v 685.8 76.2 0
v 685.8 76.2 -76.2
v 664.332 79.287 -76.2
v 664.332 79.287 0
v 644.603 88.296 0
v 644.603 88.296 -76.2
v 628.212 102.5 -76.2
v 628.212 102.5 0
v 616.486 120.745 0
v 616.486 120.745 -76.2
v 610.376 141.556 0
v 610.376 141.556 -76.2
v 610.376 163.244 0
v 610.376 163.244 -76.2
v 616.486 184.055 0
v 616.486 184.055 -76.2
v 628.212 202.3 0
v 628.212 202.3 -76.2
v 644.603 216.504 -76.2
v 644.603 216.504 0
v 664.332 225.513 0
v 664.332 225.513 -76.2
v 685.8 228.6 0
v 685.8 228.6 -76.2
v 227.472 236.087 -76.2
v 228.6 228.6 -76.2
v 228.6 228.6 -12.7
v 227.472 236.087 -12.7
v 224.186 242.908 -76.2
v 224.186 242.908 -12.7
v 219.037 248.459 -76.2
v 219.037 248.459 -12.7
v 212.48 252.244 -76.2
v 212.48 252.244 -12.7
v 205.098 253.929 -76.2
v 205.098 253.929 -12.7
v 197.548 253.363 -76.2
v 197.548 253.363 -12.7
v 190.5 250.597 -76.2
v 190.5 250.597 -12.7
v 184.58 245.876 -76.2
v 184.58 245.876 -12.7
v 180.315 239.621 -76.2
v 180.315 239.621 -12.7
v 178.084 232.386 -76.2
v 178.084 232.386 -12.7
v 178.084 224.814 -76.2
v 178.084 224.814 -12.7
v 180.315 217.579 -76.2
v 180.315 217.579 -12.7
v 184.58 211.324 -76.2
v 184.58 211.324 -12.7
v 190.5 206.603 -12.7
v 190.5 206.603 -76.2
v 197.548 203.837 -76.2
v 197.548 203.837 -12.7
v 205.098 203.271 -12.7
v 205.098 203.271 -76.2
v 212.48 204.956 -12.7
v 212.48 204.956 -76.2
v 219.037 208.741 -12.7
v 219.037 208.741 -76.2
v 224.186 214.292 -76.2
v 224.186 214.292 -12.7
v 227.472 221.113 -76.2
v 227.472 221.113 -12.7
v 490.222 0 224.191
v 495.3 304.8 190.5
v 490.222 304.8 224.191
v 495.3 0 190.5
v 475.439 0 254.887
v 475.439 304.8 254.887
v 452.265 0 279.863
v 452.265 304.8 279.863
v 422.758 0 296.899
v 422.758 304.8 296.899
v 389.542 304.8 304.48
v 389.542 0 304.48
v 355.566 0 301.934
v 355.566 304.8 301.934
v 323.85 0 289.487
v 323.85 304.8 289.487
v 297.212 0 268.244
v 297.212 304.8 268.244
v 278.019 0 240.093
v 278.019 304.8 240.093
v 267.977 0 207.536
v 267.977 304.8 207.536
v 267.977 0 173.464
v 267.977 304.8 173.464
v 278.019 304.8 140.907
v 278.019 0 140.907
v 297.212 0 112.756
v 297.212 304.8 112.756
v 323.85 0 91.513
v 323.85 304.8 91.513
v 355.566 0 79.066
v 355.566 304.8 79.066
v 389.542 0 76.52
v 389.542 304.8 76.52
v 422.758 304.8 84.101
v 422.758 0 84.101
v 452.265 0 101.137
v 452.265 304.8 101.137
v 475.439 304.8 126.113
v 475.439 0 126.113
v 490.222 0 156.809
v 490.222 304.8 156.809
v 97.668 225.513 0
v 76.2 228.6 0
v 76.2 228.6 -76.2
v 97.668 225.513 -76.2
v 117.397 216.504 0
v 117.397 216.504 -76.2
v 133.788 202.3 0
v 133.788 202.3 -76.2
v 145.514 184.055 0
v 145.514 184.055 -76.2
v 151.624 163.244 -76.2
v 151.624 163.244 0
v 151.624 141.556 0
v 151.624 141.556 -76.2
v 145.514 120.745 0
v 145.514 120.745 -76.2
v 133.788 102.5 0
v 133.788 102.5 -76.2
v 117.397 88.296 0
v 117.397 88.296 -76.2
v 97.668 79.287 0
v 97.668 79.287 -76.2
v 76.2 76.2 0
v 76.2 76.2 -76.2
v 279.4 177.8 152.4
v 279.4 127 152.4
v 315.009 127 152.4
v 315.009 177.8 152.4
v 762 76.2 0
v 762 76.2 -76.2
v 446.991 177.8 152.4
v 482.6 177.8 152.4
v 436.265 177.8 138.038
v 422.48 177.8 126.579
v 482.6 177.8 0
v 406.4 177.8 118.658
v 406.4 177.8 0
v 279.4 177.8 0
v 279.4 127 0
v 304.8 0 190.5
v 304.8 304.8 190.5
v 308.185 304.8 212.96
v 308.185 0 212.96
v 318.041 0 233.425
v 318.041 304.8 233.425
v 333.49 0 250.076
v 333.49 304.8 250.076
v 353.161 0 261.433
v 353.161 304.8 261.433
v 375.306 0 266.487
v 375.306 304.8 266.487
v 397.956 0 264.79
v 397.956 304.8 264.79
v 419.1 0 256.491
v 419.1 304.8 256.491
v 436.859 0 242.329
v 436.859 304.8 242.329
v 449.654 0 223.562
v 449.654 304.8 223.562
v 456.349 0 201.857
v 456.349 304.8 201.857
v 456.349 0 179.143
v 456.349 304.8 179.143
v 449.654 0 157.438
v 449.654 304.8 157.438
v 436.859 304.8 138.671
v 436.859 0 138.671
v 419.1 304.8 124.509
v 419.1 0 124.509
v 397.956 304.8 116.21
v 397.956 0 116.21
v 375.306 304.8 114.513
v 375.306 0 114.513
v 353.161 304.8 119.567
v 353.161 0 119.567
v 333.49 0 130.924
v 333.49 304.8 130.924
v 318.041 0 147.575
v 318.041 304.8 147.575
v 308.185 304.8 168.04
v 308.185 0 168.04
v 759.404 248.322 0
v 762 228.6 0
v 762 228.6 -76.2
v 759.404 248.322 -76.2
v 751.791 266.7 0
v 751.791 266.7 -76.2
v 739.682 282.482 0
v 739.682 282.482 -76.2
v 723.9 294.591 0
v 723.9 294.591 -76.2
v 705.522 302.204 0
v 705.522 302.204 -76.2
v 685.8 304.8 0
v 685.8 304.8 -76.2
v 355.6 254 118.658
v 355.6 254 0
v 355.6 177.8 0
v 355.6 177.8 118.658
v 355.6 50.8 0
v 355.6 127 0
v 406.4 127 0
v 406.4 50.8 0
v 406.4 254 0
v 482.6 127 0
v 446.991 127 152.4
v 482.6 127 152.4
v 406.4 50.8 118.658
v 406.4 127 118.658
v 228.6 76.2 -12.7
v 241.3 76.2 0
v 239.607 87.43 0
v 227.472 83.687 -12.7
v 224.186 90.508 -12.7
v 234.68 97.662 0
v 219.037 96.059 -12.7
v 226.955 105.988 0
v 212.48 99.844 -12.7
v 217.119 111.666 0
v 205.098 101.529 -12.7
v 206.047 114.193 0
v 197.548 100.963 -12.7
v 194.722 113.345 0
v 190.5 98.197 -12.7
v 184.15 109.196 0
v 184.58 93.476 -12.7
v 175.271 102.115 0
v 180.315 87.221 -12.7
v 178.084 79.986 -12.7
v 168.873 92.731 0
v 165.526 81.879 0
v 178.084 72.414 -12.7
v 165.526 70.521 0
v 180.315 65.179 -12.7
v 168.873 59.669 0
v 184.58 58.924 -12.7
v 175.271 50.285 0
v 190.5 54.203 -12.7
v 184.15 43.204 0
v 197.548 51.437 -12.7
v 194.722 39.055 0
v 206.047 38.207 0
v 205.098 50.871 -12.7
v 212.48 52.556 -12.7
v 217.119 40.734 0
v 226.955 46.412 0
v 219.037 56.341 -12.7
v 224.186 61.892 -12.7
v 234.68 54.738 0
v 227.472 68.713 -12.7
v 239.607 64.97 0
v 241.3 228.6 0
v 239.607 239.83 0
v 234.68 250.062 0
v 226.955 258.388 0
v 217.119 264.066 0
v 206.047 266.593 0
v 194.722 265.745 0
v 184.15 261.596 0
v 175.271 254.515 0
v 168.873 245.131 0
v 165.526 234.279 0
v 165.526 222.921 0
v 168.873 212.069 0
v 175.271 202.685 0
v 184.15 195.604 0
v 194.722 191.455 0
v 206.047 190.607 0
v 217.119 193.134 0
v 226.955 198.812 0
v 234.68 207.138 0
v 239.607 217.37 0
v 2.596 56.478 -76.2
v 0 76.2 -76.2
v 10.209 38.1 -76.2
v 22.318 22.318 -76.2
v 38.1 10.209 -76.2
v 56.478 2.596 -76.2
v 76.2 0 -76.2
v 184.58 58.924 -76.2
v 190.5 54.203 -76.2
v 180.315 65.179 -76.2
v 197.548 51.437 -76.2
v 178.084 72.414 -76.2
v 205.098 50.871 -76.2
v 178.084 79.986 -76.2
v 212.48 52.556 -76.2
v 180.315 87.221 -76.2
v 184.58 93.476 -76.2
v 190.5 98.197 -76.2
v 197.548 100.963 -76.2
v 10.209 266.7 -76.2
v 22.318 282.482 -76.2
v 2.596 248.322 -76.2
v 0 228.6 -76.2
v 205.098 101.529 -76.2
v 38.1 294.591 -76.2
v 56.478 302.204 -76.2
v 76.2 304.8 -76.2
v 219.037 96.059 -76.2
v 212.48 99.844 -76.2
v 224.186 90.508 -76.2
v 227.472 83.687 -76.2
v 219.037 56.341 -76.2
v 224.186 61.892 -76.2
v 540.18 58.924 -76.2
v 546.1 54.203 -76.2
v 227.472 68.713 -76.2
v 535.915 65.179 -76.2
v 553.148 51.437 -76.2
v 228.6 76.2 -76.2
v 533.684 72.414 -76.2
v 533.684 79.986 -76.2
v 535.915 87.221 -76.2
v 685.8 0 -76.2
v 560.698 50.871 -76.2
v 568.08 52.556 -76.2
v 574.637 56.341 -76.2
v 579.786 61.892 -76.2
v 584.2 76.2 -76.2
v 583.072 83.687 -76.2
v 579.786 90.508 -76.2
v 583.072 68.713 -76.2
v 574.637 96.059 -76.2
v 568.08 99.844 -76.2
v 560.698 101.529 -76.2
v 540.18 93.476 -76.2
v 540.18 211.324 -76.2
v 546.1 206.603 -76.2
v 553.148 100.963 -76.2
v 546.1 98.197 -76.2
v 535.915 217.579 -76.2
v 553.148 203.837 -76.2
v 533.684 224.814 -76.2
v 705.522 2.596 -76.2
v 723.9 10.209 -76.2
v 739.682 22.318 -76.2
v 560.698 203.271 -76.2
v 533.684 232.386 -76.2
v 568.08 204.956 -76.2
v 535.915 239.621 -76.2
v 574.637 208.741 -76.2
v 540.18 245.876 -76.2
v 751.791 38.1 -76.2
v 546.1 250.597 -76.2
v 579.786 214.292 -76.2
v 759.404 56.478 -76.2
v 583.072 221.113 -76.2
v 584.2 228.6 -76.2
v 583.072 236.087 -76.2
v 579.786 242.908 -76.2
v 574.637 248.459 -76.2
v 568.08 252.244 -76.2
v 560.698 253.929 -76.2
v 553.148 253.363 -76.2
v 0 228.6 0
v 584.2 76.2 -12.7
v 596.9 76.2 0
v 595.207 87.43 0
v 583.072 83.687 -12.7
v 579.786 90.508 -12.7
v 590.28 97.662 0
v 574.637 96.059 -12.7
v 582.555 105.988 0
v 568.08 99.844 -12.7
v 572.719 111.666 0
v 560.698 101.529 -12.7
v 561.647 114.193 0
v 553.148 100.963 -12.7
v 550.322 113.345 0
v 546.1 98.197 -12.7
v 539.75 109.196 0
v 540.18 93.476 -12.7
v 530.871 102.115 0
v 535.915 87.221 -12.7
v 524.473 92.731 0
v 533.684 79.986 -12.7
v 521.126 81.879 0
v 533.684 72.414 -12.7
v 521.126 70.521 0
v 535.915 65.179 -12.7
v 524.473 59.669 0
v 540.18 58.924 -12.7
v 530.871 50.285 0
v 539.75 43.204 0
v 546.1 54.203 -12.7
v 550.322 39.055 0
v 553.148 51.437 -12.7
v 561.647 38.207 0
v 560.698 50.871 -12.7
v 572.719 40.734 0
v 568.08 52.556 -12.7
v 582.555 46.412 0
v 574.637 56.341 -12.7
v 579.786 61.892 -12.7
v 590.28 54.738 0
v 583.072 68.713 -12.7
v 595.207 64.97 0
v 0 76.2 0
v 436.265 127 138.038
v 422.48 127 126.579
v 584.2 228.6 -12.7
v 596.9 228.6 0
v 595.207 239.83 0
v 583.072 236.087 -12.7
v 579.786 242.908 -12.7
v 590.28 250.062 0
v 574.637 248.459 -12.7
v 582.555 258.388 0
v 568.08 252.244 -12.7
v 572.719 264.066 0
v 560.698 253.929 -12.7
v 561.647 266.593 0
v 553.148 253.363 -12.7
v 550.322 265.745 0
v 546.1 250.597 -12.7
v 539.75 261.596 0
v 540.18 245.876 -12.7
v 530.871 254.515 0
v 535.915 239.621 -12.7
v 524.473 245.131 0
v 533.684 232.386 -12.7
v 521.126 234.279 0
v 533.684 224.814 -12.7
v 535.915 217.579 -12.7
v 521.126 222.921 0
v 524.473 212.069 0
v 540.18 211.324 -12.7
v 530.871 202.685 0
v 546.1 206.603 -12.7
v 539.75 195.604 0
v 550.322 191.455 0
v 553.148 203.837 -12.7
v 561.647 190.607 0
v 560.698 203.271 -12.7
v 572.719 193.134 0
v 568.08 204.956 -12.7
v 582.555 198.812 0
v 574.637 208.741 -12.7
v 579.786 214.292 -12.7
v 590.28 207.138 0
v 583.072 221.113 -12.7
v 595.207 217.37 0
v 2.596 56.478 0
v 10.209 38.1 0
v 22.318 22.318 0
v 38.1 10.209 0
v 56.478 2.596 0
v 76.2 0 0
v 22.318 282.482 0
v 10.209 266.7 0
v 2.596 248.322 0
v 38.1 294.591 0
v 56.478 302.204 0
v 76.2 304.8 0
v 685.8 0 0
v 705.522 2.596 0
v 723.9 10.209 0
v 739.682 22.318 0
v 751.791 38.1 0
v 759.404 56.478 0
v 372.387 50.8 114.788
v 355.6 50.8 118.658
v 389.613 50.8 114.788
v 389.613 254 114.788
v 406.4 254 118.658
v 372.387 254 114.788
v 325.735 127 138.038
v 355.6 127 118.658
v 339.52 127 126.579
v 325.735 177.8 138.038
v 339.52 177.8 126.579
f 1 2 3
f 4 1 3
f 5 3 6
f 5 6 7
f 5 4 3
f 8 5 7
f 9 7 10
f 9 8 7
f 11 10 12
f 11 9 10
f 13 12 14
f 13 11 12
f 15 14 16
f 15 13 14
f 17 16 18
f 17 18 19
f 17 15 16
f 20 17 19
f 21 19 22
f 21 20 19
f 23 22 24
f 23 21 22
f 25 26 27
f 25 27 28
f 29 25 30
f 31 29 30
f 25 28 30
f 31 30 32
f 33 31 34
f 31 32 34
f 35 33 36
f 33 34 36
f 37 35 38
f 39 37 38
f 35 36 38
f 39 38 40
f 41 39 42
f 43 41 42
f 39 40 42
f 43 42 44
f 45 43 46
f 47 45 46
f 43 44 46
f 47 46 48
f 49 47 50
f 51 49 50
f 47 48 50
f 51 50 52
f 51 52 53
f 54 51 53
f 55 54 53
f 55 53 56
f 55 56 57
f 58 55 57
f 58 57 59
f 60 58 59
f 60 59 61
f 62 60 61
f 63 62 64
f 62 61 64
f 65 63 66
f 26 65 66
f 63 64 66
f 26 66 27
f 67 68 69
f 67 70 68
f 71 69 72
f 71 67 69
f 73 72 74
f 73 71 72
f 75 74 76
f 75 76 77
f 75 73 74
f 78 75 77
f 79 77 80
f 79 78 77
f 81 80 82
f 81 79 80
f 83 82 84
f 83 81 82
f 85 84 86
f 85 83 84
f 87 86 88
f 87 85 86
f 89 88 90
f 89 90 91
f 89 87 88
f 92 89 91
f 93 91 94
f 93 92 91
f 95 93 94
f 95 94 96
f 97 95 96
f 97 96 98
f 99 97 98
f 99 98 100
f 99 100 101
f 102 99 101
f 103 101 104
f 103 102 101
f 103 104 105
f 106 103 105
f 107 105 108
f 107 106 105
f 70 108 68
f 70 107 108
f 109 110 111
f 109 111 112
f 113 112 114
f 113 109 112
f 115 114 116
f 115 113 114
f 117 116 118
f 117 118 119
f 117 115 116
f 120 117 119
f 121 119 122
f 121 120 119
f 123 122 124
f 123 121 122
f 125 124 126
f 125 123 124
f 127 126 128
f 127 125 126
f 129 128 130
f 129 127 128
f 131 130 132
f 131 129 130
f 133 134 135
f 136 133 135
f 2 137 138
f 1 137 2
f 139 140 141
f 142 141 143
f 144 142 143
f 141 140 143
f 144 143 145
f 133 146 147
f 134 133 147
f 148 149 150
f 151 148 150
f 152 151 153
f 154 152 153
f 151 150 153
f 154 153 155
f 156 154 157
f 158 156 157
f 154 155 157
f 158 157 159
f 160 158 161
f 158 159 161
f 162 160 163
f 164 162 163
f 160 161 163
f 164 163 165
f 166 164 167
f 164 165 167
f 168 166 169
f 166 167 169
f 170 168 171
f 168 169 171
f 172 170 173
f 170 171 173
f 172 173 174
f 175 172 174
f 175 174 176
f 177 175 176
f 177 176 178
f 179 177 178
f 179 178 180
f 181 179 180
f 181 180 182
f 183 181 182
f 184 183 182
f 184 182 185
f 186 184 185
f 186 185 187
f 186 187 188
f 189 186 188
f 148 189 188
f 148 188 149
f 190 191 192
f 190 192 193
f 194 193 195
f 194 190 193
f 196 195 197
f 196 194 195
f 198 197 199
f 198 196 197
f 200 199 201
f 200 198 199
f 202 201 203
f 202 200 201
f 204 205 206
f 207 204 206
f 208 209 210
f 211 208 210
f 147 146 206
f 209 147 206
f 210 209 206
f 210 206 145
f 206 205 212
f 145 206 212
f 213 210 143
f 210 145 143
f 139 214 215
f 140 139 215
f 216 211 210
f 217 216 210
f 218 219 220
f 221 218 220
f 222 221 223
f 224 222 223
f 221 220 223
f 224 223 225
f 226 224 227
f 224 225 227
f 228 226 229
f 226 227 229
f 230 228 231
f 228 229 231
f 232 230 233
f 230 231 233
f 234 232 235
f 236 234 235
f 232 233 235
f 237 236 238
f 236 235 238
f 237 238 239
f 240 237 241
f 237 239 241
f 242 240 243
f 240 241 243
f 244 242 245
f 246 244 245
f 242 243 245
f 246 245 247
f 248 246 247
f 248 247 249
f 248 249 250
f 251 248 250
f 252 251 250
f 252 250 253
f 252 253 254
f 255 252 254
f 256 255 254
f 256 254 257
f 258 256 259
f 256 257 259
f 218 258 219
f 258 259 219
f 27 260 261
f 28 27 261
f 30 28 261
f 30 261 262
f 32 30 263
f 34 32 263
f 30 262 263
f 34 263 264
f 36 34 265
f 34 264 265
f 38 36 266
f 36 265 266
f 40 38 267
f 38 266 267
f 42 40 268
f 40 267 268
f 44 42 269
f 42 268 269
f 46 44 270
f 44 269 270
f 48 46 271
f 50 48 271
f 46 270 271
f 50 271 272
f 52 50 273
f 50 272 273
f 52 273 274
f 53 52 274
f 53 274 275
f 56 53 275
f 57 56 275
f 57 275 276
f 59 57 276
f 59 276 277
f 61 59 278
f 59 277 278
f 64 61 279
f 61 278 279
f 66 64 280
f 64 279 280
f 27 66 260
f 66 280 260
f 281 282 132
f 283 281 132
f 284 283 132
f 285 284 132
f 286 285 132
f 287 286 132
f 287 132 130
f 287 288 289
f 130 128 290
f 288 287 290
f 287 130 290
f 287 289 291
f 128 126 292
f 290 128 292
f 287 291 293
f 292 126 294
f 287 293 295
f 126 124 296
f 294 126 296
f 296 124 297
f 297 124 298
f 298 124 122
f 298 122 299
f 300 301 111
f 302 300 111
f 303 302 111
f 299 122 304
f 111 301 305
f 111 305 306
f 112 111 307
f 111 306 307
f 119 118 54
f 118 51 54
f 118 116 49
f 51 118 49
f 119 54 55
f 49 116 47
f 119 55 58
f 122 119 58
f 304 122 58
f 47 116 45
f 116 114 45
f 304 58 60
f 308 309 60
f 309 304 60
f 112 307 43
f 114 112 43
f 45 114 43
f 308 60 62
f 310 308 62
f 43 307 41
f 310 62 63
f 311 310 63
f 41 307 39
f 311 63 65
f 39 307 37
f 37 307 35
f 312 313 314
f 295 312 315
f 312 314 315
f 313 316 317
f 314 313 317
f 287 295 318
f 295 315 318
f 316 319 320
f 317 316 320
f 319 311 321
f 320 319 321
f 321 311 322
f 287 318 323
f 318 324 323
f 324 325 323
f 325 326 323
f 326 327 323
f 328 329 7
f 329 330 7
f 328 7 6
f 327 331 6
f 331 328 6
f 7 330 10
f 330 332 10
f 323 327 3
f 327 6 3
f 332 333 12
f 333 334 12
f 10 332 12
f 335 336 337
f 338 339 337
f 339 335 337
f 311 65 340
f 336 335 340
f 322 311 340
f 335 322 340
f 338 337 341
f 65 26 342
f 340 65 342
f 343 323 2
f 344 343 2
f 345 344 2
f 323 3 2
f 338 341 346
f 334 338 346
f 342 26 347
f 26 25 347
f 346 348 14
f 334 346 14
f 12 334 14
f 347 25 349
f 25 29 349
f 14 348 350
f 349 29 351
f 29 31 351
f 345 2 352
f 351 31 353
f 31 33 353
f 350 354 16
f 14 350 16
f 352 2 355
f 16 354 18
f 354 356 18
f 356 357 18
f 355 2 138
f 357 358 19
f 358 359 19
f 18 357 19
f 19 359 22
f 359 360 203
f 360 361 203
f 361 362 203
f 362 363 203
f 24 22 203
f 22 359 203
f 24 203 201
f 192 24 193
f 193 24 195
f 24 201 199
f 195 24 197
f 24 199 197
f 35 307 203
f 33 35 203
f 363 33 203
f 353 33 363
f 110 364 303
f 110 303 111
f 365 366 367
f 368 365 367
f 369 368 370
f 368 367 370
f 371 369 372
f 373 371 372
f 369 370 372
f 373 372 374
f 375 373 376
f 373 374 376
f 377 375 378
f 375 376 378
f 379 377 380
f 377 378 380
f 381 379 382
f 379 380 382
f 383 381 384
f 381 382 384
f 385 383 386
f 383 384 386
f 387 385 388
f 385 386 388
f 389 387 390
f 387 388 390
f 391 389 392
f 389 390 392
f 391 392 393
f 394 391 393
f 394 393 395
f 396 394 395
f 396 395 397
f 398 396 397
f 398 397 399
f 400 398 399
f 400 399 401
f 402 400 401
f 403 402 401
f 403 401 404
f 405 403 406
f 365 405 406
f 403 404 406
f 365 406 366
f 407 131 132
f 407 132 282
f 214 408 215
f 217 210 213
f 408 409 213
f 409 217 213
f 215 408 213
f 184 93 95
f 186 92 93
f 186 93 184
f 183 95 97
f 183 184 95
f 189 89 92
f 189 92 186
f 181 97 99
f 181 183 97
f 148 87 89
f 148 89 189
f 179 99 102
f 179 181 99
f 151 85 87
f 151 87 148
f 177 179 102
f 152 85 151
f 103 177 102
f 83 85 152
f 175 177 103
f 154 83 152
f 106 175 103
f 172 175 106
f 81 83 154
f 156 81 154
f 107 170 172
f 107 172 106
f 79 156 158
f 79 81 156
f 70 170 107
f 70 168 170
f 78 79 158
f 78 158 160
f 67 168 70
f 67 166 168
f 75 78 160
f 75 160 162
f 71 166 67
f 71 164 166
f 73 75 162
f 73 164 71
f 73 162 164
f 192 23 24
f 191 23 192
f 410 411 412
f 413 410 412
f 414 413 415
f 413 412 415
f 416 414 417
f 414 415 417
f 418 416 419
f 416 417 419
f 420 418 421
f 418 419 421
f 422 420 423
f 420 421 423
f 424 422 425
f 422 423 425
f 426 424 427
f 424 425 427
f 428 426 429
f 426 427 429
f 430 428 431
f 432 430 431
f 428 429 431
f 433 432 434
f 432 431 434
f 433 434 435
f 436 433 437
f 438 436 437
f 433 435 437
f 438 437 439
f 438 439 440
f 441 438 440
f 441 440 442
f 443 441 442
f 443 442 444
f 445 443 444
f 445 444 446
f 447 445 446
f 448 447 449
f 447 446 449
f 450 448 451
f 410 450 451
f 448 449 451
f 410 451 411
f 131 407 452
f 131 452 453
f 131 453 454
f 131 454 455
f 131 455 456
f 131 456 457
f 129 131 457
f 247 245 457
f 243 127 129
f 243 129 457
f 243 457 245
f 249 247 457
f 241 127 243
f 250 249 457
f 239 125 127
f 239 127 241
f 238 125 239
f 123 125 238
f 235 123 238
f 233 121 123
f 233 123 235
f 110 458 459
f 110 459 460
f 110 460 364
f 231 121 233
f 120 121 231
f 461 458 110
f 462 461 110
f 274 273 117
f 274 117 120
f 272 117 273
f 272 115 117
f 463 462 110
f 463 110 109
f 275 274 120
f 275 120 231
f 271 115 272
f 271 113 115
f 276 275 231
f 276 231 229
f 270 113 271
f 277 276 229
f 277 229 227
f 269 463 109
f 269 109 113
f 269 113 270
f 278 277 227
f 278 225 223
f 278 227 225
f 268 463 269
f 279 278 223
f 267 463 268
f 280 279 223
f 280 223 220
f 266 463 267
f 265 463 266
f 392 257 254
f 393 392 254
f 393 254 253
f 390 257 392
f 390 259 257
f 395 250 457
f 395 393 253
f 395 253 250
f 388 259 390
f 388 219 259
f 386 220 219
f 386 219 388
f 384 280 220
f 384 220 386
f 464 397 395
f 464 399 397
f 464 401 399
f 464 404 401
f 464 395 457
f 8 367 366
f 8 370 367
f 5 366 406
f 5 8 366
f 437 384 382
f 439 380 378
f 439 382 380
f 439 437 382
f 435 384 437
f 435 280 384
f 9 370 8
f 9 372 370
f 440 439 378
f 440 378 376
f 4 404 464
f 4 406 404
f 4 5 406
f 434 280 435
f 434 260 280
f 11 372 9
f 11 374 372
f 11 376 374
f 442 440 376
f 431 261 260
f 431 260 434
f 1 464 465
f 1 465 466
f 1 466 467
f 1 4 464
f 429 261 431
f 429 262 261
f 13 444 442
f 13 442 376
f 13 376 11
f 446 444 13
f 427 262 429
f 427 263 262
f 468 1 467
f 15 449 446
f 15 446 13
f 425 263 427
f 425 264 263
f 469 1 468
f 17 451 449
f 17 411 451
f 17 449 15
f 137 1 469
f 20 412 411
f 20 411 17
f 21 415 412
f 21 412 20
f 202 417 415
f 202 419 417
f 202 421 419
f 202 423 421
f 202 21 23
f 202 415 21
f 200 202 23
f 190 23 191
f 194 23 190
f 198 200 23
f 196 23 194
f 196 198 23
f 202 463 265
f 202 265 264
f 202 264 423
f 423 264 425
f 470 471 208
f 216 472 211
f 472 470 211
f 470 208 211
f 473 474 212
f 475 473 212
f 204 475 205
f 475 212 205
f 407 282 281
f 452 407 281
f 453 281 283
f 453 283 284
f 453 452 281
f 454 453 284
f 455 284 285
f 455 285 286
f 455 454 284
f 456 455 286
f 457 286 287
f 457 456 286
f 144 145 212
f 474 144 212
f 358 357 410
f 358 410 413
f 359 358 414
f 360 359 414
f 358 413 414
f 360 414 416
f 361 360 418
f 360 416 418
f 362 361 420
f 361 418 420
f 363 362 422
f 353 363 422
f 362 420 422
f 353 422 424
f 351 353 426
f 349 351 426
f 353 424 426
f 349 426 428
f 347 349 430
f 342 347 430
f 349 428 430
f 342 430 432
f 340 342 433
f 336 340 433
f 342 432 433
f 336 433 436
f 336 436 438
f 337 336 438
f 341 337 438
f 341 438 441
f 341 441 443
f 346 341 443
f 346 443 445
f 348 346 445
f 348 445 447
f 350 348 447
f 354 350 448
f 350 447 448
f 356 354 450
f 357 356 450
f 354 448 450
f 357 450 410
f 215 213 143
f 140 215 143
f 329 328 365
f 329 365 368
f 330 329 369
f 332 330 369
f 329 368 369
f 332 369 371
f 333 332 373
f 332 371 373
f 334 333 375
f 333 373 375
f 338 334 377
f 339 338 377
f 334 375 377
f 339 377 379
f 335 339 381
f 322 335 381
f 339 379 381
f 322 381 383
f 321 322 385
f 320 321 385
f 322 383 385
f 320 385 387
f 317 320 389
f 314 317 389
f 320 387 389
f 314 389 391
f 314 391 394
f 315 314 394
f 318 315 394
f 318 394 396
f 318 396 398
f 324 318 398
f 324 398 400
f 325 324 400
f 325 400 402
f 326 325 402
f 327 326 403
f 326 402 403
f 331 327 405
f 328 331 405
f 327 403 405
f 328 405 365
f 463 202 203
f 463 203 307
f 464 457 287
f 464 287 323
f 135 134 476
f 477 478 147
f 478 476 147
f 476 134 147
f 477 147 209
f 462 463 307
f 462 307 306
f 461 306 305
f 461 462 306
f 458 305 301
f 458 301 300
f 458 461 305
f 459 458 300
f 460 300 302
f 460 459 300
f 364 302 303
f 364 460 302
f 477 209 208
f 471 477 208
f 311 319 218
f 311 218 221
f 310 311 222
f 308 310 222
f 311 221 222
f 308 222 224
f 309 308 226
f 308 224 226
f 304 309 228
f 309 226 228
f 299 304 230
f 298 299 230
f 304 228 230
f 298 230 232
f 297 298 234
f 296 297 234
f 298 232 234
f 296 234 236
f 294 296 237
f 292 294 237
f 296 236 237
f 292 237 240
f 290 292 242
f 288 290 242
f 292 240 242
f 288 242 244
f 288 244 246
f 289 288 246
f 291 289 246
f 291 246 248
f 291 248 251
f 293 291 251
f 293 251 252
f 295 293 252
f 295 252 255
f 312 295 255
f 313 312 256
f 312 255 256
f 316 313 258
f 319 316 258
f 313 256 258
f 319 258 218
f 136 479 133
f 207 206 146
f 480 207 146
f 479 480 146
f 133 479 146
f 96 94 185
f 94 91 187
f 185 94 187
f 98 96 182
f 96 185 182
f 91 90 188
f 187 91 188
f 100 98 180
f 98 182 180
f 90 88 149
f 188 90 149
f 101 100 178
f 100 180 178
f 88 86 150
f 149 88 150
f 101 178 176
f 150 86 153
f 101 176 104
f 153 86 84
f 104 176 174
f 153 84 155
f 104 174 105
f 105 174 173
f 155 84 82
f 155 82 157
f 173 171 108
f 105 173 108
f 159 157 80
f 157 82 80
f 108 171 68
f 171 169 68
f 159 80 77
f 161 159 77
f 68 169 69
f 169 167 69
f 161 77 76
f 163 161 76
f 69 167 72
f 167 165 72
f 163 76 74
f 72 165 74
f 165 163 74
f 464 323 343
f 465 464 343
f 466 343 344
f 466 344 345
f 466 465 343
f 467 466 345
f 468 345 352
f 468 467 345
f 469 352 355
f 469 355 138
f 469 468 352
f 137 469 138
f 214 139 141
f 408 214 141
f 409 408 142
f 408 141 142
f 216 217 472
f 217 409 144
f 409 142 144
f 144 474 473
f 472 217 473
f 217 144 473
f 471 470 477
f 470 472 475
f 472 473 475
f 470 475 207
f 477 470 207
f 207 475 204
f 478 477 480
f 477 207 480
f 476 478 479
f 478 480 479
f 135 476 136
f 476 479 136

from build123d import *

# Parameters (mm, degrees)
F0_R     = 38.1
F0_R_2   = 25.4
F1_DEPTH = 76.2
F2_SIZE  = 12.7
F5_DEPTH = 152.4
F8_DEPTH = 152.4
F9_D     = 152.4
F9_2_D   = 152.4


with BuildPart() as f1:
    # F0 (on Top) → F1 (new body)
    with BuildSketch(Plane.XY):
        with BuildLine():
            ThreePointArc((0, 76.2), (22.3184632736, 22.3184632736), (76.2, 0))
            Line((76.2, 0), (685.8, 0))
            ThreePointArc((685.8, 0), (739.6815367264, 22.3184632736), (762, 76.2))
            Line((762, 76.2), (685.8, 76.2))
            ThreePointArc((685.8, 76.2), (609.6, 152.4), (685.8, 228.6))
            Line((685.8, 228.6), (762, 228.6))
            ThreePointArc((762, 228.6), (739.6815367264, 282.4815367264), (685.8, 304.8))
            Line((685.8, 304.8), (76.2, 304.8))
            ThreePointArc((76.2, 304.8), (22.3184632736, 282.4815367264), (0, 228.6))
            Line((0, 228.6), (76.2, 228.6))
            ThreePointArc((76.2, 228.6), (152.4, 152.4), (76.2, 76.2))
            Line((76.2, 76.2), (0, 76.2))
        make_face()
        with Locations((203.2, 76.2)):
            Circle(F0_R, mode=Mode.SUBTRACT)
        with Locations((558.8, 76.2)):
            Circle(F0_R, mode=Mode.SUBTRACT)
        with Locations((203.2, 228.6)):
            Circle(F0_R, mode=Mode.SUBTRACT)
        Polygon((279.4, 127), (279.4, 177.8), (355.6, 177.8), (355.6, 254), (406.4, 254), (406.4, 177.8), (482.6, 177.8), (482.6, 127), (406.4, 127), (406.4, 50.8), (355.6, 50.8), (355.6, 127), align=None, mode=Mode.SUBTRACT)
        with Locations((558.8, 228.6)):
            Circle(F0_R, mode=Mode.SUBTRACT)
        Polygon((355.6, 177.8), (279.4, 177.8), (279.4, 127), (355.6, 127), (355.6, 50.8), (406.4, 50.8), (406.4, 127), (482.6, 127), (482.6, 177.8), (406.4, 177.8), (406.4, 254), (355.6, 254), align=None)
        with Locations((203.2, 228.6)):
            Circle(F0_R)
        with Locations((203.2, 228.6)):
            Circle(F0_R_2, mode=Mode.SUBTRACT)
        with Locations((203.2, 76.2)):
            Circle(F0_R)
        with Locations((203.2, 76.2)):
            Circle(F0_R_2, mode=Mode.SUBTRACT)
        with Locations((558.8, 76.2)):
            Circle(F0_R)
        with Locations((558.8, 76.2)):
            Circle(F0_R_2, mode=Mode.SUBTRACT)
        with Locations((558.8, 228.6)):
            Circle(F0_R)
        with Locations((558.8, 228.6)):
            Circle(F0_R_2, mode=Mode.SUBTRACT)
    extrude(amount=-F1_DEPTH)

    # F2
    f2_edges = [f1.edges().sort_by_distance(p)[0] for p in [
        (177.8, 228.6, 0),
        (177.8, 76.2, 0),
        (533.4, 76.2, 0),
        (533.4, 228.6, 0),
    ]]
    chamfer(f2_edges, length=F2_SIZE)


with BuildPart() as f5:
    # F4 (on offset) → F5 (new body, symmetric)
    with BuildSketch(Plane.XZ.offset(-152.4)):
        with BuildLine():
            ThreePointArc((381, 76.2), (461.8223050896, 109.6776949104), (495.3, 190.5))
            ThreePointArc((495.3, 190.5), (300.1776949104, 271.3223050896), (381, 76.2))
        make_face()
    extrude(amount=F5_DEPTH, both=True)

    # F9 (through all)
    with Locations(Plane.XZ):
        with Locations((381, 190.5)):
            Hole(F9_D / 2)


with BuildPart() as f8:
    # F0 (on Top) → F8 (new body, through all)
    with BuildSketch(Plane.XY):
        Polygon((355.6, 177.8), (279.4, 177.8), (279.4, 127), (355.6, 127), (355.6, 50.8), (406.4, 50.8), (406.4, 127), (482.6, 127), (482.6, 177.8), (406.4, 177.8), (406.4, 254), (355.6, 254), align=None)
    extrude(amount=F8_DEPTH)

    # F9#2 (through all)
    with Locations(Plane.XZ):
        with Locations((381, 190.5)):
            Hole(F9_2_D / 2)


solid = Compound([f1.part, f5.part, f8.part])
